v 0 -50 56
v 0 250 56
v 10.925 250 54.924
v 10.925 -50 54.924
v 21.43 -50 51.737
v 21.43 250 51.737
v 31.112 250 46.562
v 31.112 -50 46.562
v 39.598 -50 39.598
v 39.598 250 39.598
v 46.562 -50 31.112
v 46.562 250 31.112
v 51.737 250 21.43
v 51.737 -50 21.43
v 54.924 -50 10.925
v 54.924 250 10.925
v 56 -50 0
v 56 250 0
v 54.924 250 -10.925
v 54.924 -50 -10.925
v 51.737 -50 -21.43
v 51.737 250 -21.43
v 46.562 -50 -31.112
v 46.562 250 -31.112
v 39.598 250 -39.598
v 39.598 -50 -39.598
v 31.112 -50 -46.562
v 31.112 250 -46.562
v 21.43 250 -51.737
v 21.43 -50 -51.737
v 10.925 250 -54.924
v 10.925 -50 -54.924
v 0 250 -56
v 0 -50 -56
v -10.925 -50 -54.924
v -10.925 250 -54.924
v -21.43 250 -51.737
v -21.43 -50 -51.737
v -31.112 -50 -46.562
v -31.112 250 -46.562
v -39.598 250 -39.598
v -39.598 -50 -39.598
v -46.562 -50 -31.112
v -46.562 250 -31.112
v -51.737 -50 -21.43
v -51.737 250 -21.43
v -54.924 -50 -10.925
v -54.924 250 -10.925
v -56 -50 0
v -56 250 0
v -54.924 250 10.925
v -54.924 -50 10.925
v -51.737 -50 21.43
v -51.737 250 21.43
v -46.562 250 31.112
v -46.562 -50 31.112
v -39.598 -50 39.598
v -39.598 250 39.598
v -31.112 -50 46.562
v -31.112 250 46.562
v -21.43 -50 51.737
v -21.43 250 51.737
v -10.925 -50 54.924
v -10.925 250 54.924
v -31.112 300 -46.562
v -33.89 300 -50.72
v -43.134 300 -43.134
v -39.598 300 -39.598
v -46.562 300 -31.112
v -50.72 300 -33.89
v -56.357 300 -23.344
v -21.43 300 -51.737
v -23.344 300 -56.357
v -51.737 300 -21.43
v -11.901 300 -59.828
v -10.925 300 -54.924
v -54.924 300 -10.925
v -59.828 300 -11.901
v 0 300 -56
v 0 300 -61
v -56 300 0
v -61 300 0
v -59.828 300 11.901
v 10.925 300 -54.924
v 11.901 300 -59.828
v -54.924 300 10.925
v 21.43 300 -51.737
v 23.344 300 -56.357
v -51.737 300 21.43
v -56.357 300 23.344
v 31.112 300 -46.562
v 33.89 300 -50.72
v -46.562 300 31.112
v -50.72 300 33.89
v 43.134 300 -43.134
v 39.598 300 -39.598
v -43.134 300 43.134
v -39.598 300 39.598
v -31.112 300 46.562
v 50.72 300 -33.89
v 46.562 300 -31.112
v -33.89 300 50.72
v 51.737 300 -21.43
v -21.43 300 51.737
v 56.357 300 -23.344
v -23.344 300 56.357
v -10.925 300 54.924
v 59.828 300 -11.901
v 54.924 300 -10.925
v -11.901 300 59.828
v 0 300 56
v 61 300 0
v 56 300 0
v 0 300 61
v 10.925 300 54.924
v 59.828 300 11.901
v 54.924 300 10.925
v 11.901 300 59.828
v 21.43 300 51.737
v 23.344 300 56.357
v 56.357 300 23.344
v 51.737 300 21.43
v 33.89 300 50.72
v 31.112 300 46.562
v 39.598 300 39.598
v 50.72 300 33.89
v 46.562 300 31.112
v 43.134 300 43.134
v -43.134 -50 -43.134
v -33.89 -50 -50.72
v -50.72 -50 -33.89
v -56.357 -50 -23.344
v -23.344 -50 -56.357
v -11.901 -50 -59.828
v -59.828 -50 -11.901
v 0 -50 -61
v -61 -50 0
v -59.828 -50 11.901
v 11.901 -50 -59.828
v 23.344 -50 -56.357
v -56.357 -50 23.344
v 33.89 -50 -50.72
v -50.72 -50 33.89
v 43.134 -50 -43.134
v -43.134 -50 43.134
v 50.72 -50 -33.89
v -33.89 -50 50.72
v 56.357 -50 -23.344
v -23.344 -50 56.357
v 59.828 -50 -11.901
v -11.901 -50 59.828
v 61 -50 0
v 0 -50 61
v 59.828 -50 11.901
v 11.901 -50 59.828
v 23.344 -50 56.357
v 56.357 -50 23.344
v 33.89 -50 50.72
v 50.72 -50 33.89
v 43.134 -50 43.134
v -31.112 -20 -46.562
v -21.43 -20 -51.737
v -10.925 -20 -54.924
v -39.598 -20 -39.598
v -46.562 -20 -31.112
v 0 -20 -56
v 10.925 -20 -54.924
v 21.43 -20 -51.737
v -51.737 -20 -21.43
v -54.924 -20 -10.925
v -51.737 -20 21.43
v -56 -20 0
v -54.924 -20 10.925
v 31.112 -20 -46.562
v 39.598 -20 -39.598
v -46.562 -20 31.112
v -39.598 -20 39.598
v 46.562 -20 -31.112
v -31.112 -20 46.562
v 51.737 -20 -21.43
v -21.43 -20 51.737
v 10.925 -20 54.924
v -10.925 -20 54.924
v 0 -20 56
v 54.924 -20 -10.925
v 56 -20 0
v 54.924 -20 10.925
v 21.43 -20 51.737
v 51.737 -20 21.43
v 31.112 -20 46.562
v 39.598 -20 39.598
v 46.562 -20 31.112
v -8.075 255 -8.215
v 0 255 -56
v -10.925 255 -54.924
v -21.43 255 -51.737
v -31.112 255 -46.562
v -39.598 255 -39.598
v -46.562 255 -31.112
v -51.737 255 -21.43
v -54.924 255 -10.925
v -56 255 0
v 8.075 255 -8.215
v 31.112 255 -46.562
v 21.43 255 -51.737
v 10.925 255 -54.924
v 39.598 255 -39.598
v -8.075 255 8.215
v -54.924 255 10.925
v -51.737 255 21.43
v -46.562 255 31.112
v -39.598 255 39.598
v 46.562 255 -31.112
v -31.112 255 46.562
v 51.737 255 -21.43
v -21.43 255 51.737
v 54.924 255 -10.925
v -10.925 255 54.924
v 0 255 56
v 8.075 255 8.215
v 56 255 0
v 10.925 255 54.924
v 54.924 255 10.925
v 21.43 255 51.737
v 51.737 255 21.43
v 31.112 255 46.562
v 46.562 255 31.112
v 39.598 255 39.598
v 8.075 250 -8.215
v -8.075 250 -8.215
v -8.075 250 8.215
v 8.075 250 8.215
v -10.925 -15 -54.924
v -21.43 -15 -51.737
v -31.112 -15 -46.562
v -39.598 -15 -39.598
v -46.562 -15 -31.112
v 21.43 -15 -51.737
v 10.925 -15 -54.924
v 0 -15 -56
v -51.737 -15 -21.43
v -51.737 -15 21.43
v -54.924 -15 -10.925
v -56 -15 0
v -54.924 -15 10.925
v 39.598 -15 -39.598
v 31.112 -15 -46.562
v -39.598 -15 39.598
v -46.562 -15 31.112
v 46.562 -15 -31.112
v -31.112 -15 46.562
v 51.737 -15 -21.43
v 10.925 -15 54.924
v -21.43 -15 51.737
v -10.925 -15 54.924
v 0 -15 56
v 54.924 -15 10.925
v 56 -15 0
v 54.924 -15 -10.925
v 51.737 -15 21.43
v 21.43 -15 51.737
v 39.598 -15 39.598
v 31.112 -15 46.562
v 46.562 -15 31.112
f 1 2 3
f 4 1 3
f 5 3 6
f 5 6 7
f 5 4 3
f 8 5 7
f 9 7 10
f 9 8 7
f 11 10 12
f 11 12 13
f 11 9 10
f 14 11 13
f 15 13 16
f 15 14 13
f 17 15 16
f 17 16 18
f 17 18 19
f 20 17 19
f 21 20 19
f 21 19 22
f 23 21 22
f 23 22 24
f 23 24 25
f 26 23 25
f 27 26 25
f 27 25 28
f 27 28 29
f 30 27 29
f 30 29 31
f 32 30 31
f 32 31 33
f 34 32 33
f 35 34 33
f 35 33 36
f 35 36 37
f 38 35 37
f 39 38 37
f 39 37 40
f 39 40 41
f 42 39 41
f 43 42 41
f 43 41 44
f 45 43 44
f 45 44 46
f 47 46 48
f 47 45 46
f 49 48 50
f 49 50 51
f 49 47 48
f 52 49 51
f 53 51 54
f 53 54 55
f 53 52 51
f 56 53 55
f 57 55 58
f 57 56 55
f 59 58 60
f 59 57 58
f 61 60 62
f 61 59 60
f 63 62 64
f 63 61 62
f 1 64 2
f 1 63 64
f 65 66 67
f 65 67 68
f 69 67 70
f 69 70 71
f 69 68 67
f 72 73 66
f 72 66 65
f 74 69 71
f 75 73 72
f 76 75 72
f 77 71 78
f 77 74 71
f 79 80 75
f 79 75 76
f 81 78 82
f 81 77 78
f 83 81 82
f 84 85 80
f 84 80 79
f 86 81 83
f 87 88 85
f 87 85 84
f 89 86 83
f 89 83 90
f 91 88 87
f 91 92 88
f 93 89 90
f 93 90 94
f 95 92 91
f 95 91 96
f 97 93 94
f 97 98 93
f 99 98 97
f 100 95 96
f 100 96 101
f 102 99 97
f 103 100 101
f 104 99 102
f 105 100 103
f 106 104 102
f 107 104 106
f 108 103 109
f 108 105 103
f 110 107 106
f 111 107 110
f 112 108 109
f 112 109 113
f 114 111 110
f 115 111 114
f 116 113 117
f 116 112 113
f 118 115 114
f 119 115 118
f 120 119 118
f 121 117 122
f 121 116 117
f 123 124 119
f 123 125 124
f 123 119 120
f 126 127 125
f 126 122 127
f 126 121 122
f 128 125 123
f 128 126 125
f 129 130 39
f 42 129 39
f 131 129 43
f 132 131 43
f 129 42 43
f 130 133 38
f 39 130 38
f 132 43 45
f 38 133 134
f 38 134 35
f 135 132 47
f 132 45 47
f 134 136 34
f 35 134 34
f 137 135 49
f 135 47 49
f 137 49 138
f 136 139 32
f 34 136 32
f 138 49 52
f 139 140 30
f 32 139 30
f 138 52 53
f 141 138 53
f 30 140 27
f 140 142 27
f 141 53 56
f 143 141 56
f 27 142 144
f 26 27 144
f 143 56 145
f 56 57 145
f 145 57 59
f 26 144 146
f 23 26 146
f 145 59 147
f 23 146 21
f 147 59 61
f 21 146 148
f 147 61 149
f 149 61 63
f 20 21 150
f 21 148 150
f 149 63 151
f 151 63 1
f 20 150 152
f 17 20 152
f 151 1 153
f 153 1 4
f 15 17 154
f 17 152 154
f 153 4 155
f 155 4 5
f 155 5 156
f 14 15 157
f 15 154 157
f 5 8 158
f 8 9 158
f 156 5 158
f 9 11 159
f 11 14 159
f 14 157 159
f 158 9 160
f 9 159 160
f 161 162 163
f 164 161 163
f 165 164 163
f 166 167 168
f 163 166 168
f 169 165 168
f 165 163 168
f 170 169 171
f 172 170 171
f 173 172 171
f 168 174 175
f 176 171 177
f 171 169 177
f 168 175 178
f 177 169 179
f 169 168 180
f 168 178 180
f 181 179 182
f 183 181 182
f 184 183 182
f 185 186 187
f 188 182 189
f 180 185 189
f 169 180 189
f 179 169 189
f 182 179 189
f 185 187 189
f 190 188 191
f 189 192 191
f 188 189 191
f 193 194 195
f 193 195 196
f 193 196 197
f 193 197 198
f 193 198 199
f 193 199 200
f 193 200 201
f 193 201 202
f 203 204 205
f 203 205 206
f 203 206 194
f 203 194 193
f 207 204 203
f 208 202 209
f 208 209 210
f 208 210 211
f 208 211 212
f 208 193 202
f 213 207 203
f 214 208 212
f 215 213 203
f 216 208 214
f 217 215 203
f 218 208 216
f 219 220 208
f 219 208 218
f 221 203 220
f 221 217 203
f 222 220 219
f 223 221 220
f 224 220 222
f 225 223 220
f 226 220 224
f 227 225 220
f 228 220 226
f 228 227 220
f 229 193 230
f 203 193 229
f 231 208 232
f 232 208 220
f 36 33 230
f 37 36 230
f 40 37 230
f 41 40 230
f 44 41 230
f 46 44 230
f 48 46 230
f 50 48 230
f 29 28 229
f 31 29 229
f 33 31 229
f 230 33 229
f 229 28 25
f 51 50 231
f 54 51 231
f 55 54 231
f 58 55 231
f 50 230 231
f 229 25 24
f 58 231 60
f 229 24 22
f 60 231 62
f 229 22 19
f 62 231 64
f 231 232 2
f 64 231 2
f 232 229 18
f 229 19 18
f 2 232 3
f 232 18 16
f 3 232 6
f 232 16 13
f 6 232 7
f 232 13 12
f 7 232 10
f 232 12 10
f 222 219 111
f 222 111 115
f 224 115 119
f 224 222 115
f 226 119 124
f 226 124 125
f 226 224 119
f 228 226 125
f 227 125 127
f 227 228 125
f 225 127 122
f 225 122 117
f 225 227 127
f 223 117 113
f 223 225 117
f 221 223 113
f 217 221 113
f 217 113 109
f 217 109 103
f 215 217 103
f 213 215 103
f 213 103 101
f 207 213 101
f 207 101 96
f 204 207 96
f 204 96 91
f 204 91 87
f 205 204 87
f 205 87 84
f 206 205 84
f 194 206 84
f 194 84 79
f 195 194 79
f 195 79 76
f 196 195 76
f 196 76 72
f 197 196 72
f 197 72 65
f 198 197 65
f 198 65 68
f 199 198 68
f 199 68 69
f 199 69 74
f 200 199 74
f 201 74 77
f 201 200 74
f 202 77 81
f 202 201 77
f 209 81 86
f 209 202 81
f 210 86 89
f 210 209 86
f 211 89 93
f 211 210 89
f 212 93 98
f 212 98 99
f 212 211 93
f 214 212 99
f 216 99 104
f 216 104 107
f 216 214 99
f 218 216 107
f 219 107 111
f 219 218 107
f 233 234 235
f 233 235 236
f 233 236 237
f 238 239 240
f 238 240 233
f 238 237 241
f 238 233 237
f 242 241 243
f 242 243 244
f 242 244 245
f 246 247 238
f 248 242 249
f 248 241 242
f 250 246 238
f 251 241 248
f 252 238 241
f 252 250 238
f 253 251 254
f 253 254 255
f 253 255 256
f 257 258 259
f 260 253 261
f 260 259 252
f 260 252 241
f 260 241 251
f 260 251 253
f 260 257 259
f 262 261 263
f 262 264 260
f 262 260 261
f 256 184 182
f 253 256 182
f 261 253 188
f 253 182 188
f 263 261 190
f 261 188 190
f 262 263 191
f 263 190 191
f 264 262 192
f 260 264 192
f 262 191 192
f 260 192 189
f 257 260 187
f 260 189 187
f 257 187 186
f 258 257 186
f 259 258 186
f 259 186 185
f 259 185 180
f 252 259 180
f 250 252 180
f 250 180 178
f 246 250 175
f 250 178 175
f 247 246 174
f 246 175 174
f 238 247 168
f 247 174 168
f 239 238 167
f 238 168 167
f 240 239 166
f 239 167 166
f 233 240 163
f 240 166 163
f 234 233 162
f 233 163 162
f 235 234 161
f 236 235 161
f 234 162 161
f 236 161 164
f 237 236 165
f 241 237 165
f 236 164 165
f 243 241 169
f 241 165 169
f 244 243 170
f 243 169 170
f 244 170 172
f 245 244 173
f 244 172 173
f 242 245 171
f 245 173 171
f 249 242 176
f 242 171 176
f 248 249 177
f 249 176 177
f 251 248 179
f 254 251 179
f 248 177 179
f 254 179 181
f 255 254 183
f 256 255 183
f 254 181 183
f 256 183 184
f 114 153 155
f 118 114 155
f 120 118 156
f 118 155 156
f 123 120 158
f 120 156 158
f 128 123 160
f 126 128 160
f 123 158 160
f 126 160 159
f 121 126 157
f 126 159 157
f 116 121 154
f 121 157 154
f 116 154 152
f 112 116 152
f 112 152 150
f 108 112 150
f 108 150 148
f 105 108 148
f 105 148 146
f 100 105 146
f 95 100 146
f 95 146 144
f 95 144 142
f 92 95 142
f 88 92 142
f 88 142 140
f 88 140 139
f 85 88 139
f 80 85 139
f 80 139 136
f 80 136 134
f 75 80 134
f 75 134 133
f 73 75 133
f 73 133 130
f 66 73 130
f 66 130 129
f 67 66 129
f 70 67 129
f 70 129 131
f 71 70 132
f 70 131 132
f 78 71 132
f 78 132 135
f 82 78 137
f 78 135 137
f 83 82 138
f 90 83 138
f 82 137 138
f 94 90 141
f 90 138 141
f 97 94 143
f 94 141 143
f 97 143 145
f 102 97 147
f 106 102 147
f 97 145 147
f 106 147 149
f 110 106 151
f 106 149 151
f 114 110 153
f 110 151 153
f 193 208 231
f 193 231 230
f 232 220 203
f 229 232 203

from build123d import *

# Parameters (mm, degrees)
SKETCH1_R           = 61
SKETCH1_R_2         = 56
BOSS_EXTRUDE1_DEPTH = 300
SKETCH3_R           = 56
BOSS_EXTRUDE2_DEPTH = 5
SKETCH5_R           = 56
BOSS_EXTRUDE3_DEPTH = 5
SKETCH6_W           = 16.15
SKETCH6_H           = 16.43
CUT_EXTRUDE2_DEPTH  = 5
BOSS_EXTRUDE4_START = -50
SKETCH1_3_R         = 61
SKETCH1_3_R_2       = 56
BOSS_EXTRUDE4_DEPTH = 50


with BuildPart() as part:
    # Sketch1 → Boss-Extrude1 (new body)
    with BuildSketch(Plane(origin=(0, 0, 0), x_dir=(1, 0, 0), z_dir=(0, 1, 0))):
        with Locations(Location((0, 0, 0), (0, 0, 270))):
            Circle(SKETCH1_R)
        with Locations(Location((0, 0, 0), (0, 0, 270))):
            Circle(SKETCH1_R_2, mode=Mode.SUBTRACT)
    extrude(amount=BOSS_EXTRUDE1_DEPTH)

    # Sketch5 → Boss-Extrude3 (add)
    with BuildSketch(Plane(origin=(0, 250, 0), x_dir=(1, 0, 0), z_dir=(0, 1, 0))):
        with Locations(Location((0, 0, 0), (0, 0, 270))):
            Circle(SKETCH5_R)
    extrude(amount=BOSS_EXTRUDE3_DEPTH)

    # Sketch6 → Cut-Extrude2 (cut)
    with BuildSketch(Plane(origin=(0, 255, 0), x_dir=(1, 0, 0), z_dir=(0, 1, 0))):
        Rectangle(SKETCH6_W, SKETCH6_H)
    extrude(amount=-CUT_EXTRUDE2_DEPTH, mode=Mode.SUBTRACT)

    # Sketch1<3> → Boss-Extrude4 (add)
    with BuildSketch(Plane(origin=(0, 0, 0), x_dir=(1, 0, 0), z_dir=(0, 1, 0)).offset(BOSS_EXTRUDE4_START)):
        with Locations(Location((0, 0, 0), (0, 0, 270))):
            Circle(SKETCH1_3_R)
        with Locations(Location((0, 0, 0), (0, 0, 270))):
            Circle(SKETCH1_3_R_2, mode=Mode.SUBTRACT)
    extrude(amount=BOSS_EXTRUDE4_DEPTH)


with BuildPart() as body_2:
    # Sketch3 → Boss-Extrude2 (new body)
    with BuildSketch(Plane(origin=(0, -20, 0), x_dir=(1, 0, 0), z_dir=(0, 1, 0))):
        with Locations(Location((0, 0, 0), (0, 0, 270))):
            Circle(SKETCH3_R)
    extrude(amount=BOSS_EXTRUDE2_DEPTH)


solid = Compound([part.part, body_2.part])
